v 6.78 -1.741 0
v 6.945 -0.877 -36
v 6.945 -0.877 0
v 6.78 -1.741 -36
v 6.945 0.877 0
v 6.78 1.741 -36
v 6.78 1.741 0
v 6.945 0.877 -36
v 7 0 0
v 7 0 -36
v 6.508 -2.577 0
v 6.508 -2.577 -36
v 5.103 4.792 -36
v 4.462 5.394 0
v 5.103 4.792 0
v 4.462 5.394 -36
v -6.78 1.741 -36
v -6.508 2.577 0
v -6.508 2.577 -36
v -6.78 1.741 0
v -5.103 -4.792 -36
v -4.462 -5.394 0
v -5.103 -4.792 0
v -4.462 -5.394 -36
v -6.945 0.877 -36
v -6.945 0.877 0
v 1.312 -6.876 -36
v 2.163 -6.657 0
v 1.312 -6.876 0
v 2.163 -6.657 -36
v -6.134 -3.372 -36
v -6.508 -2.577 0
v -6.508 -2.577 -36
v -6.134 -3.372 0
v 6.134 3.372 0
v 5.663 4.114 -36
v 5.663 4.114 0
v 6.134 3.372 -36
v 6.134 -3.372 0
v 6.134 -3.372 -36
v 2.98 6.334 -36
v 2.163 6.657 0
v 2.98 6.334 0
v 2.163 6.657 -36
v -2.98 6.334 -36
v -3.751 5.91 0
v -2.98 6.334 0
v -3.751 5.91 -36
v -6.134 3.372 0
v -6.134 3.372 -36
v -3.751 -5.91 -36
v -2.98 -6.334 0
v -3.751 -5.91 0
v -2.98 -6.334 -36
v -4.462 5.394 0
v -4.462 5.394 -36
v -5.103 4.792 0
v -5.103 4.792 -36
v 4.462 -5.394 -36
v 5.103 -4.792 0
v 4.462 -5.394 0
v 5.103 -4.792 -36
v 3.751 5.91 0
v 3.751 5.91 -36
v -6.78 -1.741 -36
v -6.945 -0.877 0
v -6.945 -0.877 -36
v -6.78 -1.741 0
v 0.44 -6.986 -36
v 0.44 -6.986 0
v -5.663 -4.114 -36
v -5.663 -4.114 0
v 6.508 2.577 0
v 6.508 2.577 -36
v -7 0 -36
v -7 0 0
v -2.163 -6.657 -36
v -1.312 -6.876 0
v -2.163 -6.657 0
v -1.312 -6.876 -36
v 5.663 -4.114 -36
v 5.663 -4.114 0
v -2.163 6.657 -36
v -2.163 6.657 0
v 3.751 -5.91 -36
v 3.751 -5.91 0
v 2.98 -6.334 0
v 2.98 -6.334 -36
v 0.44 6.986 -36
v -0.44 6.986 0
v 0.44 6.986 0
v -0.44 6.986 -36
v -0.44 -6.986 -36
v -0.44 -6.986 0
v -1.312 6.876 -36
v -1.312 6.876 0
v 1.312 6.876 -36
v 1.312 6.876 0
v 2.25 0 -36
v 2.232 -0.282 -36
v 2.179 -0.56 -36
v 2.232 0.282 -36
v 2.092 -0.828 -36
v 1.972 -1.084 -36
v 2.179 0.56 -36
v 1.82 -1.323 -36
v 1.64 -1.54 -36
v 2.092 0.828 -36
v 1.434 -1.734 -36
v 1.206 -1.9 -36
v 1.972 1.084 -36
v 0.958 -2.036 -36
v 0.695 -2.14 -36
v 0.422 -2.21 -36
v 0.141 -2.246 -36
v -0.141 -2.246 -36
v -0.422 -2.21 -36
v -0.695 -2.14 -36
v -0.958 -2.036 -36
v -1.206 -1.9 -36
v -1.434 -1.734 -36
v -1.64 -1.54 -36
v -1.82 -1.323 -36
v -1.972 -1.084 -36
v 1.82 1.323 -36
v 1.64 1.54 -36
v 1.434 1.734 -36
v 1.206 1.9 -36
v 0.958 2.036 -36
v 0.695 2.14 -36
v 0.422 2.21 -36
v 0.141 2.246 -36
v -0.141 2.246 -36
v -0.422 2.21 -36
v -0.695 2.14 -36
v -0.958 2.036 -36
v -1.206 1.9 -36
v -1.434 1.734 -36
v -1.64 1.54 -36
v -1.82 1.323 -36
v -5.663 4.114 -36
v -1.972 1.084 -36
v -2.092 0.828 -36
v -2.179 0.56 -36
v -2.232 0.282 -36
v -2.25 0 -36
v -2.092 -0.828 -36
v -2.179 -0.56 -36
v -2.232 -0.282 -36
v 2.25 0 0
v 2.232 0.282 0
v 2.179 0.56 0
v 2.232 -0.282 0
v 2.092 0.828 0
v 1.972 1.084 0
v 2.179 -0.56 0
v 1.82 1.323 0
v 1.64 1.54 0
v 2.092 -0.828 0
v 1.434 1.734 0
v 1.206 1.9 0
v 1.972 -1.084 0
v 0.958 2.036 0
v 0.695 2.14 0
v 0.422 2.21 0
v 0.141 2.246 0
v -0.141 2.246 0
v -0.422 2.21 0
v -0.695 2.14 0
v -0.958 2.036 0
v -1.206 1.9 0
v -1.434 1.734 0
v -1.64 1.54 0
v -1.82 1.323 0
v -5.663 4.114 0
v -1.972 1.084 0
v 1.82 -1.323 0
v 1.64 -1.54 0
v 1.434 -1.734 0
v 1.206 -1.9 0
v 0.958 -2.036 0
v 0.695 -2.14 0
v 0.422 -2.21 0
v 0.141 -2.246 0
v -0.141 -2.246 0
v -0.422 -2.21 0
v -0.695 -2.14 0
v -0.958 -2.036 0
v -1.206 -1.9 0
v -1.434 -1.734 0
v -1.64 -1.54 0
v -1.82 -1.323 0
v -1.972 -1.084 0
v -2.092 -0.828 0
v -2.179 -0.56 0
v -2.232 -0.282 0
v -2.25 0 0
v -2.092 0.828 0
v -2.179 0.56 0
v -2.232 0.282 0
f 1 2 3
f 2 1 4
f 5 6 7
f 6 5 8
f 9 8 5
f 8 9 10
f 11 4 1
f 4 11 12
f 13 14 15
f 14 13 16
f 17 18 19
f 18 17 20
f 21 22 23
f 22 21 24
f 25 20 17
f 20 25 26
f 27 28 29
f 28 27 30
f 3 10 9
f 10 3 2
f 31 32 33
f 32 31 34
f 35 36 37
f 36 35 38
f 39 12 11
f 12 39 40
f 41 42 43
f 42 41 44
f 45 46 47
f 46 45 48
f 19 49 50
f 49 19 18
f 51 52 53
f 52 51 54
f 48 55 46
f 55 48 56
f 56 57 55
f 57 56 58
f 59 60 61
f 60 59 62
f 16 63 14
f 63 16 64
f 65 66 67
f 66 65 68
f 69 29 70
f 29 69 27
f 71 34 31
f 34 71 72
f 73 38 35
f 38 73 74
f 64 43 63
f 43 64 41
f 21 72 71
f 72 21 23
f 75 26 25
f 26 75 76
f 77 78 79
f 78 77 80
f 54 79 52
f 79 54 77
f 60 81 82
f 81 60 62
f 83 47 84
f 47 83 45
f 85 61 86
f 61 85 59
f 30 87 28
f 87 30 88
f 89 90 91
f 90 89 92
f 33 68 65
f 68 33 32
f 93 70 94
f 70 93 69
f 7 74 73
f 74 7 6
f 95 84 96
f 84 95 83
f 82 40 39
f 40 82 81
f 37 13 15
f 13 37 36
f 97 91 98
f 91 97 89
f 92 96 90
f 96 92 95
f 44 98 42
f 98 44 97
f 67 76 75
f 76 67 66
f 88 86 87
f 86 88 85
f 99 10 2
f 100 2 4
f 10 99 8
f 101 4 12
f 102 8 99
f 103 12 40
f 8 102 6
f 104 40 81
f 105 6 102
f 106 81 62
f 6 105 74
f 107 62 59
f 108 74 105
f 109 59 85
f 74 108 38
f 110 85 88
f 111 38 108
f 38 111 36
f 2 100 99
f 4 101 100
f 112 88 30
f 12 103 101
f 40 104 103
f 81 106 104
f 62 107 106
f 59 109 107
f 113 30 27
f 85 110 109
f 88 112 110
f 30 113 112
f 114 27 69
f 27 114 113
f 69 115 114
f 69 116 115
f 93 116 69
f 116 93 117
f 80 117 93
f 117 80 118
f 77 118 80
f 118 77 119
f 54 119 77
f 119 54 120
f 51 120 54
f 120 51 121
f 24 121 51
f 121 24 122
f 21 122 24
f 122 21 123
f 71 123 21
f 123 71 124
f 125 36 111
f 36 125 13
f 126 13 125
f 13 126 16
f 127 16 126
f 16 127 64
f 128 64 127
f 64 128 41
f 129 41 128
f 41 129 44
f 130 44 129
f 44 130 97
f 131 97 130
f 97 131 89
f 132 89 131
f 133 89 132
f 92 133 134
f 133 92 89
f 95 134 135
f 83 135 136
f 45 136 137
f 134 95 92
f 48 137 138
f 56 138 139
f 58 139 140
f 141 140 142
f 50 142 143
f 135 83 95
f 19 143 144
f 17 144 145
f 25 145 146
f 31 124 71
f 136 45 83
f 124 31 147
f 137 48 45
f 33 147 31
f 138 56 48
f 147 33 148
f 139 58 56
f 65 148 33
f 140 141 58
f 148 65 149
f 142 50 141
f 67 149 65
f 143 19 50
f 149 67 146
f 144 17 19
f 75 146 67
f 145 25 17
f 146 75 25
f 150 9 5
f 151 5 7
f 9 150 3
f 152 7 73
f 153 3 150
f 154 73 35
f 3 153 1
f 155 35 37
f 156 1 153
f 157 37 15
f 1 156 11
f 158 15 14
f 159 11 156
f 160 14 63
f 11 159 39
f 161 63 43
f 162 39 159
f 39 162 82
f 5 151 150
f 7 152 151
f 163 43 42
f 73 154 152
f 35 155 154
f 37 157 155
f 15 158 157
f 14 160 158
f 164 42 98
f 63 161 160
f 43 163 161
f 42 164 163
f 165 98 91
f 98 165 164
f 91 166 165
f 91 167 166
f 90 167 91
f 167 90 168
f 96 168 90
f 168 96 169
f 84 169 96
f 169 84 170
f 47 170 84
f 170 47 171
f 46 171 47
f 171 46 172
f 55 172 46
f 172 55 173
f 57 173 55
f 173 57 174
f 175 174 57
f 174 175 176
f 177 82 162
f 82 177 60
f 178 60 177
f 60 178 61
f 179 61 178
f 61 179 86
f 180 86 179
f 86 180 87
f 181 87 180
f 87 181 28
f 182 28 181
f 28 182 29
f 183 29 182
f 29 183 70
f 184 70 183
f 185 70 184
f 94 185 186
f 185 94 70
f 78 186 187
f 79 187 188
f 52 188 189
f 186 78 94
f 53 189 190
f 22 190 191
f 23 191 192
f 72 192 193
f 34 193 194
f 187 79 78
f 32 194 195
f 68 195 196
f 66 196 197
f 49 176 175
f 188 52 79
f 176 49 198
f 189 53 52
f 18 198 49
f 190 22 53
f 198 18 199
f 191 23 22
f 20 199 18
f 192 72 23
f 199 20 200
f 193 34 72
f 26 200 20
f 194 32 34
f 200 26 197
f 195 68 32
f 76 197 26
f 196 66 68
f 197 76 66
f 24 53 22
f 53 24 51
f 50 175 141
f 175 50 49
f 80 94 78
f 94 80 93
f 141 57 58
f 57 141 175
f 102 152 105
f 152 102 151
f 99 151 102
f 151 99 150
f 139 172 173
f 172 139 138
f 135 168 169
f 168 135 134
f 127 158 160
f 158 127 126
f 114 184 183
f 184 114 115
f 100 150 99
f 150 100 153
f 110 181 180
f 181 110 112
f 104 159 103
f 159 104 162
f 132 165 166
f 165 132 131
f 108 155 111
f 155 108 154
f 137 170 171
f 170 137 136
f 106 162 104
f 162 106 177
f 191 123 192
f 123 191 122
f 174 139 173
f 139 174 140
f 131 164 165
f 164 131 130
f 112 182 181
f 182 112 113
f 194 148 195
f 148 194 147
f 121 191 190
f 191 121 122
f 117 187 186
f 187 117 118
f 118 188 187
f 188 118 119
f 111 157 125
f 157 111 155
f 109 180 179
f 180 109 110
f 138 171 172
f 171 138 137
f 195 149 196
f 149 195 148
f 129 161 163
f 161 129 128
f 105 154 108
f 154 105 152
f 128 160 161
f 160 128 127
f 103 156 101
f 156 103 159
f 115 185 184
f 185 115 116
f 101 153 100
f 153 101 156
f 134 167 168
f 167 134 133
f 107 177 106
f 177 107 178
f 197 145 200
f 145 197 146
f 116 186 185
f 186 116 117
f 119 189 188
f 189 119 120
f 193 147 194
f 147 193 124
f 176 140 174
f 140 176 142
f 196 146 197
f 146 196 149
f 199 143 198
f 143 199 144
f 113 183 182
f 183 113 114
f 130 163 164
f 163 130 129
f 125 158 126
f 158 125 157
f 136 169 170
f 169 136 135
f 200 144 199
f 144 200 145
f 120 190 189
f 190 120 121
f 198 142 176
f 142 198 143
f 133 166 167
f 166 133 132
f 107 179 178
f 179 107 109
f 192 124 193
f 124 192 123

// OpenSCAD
$fn = 50;


difference() {
	union() {
		translate(v = [0, 0, -36.0000000000]) {
			cylinder(h = 36, r = 7.0000000000);
		}
		cylinder(h = 0, r = 13.0000000000);
	}
	union() {
		#translate(v = [0, 0, -36]) {
			cylinder(h = 36, r = 2.2500000000);
		}
	}
}
